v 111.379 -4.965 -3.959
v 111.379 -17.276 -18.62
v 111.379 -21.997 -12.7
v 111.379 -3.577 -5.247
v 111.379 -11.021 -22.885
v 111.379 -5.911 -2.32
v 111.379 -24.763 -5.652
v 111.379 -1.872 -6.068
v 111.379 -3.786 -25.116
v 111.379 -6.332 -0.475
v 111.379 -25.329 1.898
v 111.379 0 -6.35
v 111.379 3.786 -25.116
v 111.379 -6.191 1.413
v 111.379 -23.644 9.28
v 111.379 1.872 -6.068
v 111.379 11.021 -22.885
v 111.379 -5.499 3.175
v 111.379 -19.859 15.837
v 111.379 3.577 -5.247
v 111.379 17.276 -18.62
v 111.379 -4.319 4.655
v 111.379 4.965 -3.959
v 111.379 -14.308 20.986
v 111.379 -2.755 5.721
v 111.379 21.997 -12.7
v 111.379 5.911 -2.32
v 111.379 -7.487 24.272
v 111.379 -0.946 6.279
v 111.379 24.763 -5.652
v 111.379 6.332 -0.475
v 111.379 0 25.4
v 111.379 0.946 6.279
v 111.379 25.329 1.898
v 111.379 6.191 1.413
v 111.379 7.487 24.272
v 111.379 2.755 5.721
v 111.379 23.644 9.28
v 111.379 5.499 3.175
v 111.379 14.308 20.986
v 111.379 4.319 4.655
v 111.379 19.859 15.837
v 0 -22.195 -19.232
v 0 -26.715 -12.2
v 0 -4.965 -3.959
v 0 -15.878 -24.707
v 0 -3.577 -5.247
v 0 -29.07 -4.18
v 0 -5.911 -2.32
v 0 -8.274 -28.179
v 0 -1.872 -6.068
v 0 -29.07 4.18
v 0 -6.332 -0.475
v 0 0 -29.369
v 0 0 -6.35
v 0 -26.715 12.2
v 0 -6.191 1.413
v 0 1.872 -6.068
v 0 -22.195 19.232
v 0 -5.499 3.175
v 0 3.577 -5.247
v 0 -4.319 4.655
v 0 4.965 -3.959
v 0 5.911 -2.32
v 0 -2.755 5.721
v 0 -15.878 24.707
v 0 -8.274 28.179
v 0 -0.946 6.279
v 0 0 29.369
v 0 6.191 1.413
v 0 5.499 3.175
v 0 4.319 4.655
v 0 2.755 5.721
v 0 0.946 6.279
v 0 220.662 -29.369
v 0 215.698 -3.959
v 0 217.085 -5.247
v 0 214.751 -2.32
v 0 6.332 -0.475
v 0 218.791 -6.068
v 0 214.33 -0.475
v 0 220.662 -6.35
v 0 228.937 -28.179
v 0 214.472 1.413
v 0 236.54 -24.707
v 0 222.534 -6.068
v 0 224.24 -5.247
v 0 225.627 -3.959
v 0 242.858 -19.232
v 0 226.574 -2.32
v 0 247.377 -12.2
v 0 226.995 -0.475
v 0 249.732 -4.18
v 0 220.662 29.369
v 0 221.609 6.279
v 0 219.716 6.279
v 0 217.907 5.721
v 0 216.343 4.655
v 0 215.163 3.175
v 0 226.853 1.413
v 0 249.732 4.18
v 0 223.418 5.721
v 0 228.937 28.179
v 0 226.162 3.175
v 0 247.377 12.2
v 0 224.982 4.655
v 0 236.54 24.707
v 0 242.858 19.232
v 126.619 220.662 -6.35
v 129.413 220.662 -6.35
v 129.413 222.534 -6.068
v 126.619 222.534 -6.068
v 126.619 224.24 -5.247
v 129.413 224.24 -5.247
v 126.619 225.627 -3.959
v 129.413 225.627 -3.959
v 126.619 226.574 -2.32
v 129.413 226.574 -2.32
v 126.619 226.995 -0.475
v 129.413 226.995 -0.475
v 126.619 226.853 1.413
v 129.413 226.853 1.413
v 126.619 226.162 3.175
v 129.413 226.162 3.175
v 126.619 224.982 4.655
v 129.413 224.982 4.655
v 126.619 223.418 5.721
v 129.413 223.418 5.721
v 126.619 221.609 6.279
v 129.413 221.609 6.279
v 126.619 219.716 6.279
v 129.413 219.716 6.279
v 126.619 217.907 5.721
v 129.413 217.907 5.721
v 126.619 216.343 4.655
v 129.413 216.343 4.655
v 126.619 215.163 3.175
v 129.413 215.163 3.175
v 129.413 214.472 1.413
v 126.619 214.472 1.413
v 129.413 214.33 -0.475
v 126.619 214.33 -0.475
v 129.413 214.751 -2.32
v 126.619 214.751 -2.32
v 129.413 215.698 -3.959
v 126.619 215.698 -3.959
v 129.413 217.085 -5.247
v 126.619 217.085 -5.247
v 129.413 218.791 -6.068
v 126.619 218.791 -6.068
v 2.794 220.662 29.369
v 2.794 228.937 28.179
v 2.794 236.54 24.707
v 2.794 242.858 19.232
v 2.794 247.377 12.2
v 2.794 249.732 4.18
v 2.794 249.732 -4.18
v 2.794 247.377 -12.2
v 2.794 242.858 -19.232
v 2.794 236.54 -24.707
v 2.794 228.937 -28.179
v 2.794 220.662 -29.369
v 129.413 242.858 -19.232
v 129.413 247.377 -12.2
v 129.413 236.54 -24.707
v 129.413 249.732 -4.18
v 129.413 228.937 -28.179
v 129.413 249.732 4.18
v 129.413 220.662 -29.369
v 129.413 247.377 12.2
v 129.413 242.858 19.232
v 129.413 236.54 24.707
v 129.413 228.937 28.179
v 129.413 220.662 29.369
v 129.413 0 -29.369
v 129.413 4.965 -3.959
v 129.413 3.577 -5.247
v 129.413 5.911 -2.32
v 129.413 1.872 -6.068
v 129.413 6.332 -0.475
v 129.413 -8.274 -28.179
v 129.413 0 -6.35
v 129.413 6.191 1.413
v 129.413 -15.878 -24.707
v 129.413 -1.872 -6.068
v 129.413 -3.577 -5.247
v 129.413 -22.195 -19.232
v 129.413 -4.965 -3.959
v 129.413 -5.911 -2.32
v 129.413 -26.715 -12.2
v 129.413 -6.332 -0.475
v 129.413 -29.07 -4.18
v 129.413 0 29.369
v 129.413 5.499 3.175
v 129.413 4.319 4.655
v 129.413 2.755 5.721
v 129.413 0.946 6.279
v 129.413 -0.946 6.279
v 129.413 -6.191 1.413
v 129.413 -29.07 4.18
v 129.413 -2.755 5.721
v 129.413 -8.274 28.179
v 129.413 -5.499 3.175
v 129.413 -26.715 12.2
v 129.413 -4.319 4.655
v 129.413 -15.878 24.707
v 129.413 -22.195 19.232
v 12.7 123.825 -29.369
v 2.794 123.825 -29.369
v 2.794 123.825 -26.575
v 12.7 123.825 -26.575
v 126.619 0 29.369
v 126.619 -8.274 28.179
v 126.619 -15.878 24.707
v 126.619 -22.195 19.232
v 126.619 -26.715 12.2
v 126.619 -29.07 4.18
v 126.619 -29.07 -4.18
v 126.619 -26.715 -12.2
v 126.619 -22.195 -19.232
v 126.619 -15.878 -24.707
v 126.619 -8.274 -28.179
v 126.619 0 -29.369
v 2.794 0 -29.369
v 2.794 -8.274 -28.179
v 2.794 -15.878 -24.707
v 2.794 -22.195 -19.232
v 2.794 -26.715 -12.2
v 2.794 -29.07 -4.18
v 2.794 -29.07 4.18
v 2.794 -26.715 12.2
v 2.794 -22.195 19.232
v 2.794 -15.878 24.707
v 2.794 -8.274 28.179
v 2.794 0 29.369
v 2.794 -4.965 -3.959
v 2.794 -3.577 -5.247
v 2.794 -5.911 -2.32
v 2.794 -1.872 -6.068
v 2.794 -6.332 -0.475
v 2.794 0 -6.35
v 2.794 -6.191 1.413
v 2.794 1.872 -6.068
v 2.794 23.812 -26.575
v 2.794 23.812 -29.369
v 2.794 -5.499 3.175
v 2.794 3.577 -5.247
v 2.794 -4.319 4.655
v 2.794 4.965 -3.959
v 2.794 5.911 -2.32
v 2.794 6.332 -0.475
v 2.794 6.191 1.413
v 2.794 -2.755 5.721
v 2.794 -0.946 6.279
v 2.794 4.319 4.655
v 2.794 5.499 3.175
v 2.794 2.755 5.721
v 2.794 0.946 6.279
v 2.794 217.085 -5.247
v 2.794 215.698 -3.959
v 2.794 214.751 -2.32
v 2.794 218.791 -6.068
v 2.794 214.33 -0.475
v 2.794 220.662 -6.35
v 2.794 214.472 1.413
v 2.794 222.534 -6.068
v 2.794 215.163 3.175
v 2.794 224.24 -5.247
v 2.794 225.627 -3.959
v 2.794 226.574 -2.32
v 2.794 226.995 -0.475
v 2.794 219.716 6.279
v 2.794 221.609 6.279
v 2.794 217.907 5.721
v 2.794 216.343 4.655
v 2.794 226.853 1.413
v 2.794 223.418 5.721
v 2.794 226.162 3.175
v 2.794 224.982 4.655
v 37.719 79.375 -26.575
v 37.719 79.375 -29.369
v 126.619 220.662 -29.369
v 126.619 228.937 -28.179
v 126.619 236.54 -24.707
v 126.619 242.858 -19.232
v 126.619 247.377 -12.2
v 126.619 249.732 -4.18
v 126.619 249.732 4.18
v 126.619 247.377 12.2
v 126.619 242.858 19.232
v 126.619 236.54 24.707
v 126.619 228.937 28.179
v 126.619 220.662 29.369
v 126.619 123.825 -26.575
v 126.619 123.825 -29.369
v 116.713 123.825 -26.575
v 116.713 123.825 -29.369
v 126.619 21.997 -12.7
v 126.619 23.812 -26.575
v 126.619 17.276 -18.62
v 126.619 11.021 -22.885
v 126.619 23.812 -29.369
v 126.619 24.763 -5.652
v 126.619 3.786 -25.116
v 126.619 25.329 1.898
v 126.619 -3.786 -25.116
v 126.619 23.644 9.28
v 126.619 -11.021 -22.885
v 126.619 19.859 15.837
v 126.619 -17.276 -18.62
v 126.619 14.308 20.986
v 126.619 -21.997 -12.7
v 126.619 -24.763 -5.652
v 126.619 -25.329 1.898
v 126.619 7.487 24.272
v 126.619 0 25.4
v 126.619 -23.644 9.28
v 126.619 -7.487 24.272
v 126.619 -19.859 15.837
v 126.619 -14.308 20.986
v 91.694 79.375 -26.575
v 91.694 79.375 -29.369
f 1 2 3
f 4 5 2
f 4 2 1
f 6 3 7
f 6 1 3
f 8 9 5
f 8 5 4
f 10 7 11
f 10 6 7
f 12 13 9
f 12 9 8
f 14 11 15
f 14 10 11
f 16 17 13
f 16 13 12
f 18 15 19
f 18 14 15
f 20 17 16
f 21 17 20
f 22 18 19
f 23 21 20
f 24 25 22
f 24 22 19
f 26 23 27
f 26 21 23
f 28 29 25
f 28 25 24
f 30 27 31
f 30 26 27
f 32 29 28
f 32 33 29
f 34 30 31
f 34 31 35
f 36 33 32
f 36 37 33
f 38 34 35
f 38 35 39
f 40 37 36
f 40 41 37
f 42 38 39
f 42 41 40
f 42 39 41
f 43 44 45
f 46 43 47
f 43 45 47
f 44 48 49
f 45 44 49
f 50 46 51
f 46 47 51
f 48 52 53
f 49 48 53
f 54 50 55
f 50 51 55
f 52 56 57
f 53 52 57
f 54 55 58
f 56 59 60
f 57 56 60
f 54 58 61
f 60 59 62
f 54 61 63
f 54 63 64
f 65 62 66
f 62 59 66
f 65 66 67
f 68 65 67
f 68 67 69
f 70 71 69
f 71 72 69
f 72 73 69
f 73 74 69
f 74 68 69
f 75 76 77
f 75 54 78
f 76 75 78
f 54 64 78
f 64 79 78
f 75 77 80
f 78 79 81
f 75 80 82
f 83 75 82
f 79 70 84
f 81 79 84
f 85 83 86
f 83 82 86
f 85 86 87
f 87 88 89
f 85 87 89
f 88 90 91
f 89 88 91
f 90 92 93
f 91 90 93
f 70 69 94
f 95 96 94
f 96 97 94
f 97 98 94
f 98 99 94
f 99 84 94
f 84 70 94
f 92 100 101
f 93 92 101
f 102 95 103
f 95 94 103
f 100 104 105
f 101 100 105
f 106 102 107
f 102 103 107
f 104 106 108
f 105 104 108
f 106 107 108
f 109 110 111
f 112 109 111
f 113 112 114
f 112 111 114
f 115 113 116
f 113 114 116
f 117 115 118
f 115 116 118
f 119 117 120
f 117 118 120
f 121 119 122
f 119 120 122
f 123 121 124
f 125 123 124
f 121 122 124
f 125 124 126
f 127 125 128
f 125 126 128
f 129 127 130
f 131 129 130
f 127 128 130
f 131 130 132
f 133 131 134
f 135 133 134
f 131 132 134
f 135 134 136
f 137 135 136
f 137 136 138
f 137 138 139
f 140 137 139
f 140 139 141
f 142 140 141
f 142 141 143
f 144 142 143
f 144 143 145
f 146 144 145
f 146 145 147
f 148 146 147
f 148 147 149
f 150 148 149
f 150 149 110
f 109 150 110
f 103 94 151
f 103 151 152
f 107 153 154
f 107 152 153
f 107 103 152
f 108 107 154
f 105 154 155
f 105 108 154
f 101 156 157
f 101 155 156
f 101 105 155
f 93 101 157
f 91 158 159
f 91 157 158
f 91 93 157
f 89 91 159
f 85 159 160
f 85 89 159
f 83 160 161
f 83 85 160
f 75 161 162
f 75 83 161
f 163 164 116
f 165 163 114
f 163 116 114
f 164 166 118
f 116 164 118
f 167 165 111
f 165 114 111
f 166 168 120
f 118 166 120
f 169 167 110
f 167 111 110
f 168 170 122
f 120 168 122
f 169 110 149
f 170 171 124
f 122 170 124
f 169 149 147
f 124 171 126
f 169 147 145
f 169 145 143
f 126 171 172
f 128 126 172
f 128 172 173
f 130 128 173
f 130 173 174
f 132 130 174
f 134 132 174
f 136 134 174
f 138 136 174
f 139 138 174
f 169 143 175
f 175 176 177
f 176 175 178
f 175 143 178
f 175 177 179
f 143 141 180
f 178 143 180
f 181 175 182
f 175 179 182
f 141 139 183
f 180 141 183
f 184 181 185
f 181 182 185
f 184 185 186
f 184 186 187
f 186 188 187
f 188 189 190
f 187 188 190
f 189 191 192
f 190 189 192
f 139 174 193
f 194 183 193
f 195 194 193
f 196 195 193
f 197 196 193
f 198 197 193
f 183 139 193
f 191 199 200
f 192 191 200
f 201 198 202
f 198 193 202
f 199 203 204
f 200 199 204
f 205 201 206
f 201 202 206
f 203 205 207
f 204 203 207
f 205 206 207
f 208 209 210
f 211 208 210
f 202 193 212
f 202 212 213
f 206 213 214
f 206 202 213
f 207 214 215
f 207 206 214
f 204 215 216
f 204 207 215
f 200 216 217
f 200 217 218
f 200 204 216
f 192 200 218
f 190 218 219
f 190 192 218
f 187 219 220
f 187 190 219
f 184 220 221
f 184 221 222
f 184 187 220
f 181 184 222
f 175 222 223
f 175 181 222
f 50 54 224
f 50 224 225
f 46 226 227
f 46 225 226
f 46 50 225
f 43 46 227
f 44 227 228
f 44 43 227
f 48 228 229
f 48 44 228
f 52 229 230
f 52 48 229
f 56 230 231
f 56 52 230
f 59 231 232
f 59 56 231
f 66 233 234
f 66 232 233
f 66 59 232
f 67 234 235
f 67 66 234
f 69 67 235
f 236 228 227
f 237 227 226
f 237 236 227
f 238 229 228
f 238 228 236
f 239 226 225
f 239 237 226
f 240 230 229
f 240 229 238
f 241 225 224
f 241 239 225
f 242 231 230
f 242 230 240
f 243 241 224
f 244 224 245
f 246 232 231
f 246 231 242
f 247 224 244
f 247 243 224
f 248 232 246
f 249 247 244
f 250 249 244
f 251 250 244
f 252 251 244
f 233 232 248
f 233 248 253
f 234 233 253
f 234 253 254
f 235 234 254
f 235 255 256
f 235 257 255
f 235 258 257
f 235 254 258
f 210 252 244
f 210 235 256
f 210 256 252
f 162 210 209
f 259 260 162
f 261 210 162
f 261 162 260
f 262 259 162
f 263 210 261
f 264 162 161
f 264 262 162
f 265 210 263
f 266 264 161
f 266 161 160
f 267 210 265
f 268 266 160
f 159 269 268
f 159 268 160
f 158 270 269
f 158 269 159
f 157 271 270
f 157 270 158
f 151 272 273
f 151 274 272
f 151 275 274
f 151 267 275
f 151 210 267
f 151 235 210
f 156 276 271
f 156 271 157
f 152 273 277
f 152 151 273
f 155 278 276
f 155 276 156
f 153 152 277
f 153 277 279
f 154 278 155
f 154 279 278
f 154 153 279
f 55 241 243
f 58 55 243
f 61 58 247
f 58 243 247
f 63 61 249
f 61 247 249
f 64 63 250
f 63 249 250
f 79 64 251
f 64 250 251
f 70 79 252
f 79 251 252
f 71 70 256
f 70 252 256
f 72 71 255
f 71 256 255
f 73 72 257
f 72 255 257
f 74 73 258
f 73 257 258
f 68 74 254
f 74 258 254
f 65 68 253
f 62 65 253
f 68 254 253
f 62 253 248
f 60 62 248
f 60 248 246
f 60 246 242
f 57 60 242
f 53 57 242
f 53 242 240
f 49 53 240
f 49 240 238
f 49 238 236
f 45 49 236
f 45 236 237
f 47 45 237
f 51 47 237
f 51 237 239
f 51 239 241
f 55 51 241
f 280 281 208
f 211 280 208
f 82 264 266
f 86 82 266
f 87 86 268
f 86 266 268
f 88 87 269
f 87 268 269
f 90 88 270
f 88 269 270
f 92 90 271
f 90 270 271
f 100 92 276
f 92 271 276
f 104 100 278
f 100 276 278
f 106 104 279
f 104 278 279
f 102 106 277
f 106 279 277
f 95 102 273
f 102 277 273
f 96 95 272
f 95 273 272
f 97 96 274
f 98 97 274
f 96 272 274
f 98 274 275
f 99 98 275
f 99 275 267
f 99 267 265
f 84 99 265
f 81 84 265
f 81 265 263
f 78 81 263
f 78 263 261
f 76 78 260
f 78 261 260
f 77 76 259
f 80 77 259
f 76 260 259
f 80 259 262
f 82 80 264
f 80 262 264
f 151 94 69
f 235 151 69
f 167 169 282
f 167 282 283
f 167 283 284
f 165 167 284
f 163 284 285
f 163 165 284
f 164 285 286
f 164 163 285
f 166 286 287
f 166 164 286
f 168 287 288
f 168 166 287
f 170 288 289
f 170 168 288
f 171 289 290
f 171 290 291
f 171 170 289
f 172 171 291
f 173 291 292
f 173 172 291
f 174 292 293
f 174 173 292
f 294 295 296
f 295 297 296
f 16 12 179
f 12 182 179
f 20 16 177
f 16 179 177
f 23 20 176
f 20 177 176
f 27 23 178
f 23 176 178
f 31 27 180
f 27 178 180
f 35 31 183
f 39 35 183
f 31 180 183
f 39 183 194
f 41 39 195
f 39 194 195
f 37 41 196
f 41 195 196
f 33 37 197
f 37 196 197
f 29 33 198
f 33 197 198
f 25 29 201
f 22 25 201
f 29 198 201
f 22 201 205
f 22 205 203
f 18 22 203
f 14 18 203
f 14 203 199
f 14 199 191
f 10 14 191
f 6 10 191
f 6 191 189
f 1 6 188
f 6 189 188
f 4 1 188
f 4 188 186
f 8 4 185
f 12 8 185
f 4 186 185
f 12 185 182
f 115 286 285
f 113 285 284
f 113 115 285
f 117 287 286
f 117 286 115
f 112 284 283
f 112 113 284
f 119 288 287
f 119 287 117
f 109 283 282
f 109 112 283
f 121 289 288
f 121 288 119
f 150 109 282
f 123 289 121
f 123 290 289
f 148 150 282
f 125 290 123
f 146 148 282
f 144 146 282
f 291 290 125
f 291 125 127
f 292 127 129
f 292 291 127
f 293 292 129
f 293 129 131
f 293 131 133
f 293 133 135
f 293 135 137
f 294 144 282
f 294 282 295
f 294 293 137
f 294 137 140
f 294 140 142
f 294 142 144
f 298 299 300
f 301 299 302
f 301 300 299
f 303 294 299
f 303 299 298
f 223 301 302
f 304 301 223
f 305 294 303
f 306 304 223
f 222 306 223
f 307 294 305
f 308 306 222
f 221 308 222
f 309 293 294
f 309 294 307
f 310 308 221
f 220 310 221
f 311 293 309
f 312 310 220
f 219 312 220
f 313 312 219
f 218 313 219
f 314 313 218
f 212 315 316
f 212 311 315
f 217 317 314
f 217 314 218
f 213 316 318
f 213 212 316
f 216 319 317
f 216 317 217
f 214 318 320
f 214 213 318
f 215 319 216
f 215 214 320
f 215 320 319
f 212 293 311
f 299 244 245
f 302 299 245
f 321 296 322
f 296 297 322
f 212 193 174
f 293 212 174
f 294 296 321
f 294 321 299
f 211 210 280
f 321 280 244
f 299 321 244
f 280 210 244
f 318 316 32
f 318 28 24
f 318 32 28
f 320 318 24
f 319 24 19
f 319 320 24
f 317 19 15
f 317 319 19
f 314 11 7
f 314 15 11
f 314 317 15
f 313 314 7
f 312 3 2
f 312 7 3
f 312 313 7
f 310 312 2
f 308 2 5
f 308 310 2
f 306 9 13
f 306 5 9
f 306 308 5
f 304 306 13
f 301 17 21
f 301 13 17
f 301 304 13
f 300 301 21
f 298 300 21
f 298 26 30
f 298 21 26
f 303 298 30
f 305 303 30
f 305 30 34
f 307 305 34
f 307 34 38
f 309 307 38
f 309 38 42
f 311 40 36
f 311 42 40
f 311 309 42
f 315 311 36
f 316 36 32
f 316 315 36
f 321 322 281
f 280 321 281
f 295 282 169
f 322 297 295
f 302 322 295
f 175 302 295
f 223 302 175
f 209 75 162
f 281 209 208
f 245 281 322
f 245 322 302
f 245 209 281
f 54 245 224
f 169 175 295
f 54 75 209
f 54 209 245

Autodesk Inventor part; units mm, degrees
ref_plane "YZ Plane" through (0, 0, 0) normal (1, 0, 0) x (0, 1, 0)
ref_plane "XZ Plane" through (0, 0, 0) normal (0, 1, 0) x (-1, 0, 0)
sketch "Sketch1" plane through (0, 0, 0) normal (1, 0, 0) x (0, 1, 0)
  circle A0 centre (0, 0) radius 29.3688
  circle A1 centre (220.6625, 0) radius 29.3688
  line L0 (220.6625, -29.3688) -> (0, -29.3688)
  line L1 (220.6625, 29.3687) -> (0, 29.3687)
  line L2 (0, 0) -> (220.6625, 0) construction
  dimension "d0" = 58.7375
  dimension "d1" = 220.6625
extrude "Extrusion1" add sketch "Sketch1" along normal blind 2.794
ref_plane "Work Plane2" through (64.7065, 0, 0) normal (1, 0, 0) x (0, 0, -1)
ref_plane "Work Plane1" through (126.619, 0, 0) normal (1, 0, 0) x (0, 0, -1)
mirror "Mirror1" about plane through (64.7065, 0, 0) normal (1, 0, 0) of "Extrusion1"
sketch "Sketch2" plane through (2.794, 0, 0) normal (1, 0, 0) x (0, 0, -1)
  line L0 (29.3688, 0) -> (29.3688, 220.6625) projected
  line L1 (29.3688, 123.825) -> (26.5748, 123.825)
  line L2 (26.5748, 123.825) -> (26.5748, 23.8125)
  line L3 (26.5748, 23.8125) -> (29.3688, 23.8125)
  line L4 (29.3688, 23.8125) -> (29.3688, 123.825)
  arc A0 (29.3688, 220.6625) -> (-29.3687, 220.6625) centre (0, 220.6625) ccw projected
  point P0 (0, 0)
  dimension "d6" = 100.0125
  dimension "d7" = 2.794
  dimension "d8" = 96.8375
extrude "Extrusion2" add sketch "Sketch2" along normal up to next
sketch "Sketch3" plane through (0, 0, -29.3688) normal (0, 0, -1) x (-1, 0, 0)
  line L0 (0, 0) -> (0, 220.6625) projected
  line L1 (0, 220.6625) -> (-2.794, 220.6625) projected
  line L2 (-2.794, 123.825) -> (-2.794, 220.6625) projected
  line L3 (-2.794, 123.825) -> (-126.619, 123.825) projected
  line L4 (-126.619, 123.825) -> (-126.619, 220.6625) projected
  line L5 (-129.413, 220.6625) -> (-126.619, 220.6625) projected
  line L6 (-129.413, 0) -> (-129.413, 220.6625) projected
  line L7 (-129.413, 0) -> (-126.619, 0) projected
  line L8 (-126.619, 0) -> (-126.619, 23.8125) projected
  line L9 (-2.794, 23.8125) -> (-126.619, 23.8125) projected
  line L10 (-2.794, 0) -> (-2.794, 23.8125) projected
  line L11 (0, 0) -> (-2.794, 0) projected
  line L12 (-116.713, 123.825) -> (-91.694, 79.375)
  line L13 (-91.694, 79.375) -> (-37.719, 79.375)
  line L14 (-37.719, 79.375) -> (-12.7, 123.825)
  line L15 (-64.7065, 79.375) -> (-64.7065, 123.825)
  point P0 (0, 0)
  dimension "d11" = 12.7
  dimension "d12" = 12.7
  dimension "d13" = 53.975
  dimension "d14" = 44.45
extrude "Extrusion3" cut sketch "Sketch3" against normal blind 2.794 contours L14 L13 L15 L3 | L15 L13 L12 L3
sketch "Sketch5" plane through (126.619, 0, 29.3687) normal (-1, 0, 0) x (0, 0, 1)
  circle A0 centre (-29.3687, 0) radius 25.4
  dimension "d21" = 50.8
extrude "Extrusion5" add sketch "Sketch5" along normal blind 15.24
sketch "Sketch4" plane through (129.413, 0, 29.3687) normal (1, 0, 0) x (0, 0, -1)
  arc A0 (58.7375, 220.6625) -> (0, 220.6625) centre (29.3687, 220.6625) ccw projected
  circle A1 centre (29.3687, 220.6625) radius 6.35
  circle A2 centre (29.3687, 0) radius 6.35
  dimension "d17" = 12.7
  dimension "d18" = 12.7
extrude "Extrusion4" cut sketch "Sketch4" against normal through all
properties part number "Top_Arm" material "Aluminum 6061"
